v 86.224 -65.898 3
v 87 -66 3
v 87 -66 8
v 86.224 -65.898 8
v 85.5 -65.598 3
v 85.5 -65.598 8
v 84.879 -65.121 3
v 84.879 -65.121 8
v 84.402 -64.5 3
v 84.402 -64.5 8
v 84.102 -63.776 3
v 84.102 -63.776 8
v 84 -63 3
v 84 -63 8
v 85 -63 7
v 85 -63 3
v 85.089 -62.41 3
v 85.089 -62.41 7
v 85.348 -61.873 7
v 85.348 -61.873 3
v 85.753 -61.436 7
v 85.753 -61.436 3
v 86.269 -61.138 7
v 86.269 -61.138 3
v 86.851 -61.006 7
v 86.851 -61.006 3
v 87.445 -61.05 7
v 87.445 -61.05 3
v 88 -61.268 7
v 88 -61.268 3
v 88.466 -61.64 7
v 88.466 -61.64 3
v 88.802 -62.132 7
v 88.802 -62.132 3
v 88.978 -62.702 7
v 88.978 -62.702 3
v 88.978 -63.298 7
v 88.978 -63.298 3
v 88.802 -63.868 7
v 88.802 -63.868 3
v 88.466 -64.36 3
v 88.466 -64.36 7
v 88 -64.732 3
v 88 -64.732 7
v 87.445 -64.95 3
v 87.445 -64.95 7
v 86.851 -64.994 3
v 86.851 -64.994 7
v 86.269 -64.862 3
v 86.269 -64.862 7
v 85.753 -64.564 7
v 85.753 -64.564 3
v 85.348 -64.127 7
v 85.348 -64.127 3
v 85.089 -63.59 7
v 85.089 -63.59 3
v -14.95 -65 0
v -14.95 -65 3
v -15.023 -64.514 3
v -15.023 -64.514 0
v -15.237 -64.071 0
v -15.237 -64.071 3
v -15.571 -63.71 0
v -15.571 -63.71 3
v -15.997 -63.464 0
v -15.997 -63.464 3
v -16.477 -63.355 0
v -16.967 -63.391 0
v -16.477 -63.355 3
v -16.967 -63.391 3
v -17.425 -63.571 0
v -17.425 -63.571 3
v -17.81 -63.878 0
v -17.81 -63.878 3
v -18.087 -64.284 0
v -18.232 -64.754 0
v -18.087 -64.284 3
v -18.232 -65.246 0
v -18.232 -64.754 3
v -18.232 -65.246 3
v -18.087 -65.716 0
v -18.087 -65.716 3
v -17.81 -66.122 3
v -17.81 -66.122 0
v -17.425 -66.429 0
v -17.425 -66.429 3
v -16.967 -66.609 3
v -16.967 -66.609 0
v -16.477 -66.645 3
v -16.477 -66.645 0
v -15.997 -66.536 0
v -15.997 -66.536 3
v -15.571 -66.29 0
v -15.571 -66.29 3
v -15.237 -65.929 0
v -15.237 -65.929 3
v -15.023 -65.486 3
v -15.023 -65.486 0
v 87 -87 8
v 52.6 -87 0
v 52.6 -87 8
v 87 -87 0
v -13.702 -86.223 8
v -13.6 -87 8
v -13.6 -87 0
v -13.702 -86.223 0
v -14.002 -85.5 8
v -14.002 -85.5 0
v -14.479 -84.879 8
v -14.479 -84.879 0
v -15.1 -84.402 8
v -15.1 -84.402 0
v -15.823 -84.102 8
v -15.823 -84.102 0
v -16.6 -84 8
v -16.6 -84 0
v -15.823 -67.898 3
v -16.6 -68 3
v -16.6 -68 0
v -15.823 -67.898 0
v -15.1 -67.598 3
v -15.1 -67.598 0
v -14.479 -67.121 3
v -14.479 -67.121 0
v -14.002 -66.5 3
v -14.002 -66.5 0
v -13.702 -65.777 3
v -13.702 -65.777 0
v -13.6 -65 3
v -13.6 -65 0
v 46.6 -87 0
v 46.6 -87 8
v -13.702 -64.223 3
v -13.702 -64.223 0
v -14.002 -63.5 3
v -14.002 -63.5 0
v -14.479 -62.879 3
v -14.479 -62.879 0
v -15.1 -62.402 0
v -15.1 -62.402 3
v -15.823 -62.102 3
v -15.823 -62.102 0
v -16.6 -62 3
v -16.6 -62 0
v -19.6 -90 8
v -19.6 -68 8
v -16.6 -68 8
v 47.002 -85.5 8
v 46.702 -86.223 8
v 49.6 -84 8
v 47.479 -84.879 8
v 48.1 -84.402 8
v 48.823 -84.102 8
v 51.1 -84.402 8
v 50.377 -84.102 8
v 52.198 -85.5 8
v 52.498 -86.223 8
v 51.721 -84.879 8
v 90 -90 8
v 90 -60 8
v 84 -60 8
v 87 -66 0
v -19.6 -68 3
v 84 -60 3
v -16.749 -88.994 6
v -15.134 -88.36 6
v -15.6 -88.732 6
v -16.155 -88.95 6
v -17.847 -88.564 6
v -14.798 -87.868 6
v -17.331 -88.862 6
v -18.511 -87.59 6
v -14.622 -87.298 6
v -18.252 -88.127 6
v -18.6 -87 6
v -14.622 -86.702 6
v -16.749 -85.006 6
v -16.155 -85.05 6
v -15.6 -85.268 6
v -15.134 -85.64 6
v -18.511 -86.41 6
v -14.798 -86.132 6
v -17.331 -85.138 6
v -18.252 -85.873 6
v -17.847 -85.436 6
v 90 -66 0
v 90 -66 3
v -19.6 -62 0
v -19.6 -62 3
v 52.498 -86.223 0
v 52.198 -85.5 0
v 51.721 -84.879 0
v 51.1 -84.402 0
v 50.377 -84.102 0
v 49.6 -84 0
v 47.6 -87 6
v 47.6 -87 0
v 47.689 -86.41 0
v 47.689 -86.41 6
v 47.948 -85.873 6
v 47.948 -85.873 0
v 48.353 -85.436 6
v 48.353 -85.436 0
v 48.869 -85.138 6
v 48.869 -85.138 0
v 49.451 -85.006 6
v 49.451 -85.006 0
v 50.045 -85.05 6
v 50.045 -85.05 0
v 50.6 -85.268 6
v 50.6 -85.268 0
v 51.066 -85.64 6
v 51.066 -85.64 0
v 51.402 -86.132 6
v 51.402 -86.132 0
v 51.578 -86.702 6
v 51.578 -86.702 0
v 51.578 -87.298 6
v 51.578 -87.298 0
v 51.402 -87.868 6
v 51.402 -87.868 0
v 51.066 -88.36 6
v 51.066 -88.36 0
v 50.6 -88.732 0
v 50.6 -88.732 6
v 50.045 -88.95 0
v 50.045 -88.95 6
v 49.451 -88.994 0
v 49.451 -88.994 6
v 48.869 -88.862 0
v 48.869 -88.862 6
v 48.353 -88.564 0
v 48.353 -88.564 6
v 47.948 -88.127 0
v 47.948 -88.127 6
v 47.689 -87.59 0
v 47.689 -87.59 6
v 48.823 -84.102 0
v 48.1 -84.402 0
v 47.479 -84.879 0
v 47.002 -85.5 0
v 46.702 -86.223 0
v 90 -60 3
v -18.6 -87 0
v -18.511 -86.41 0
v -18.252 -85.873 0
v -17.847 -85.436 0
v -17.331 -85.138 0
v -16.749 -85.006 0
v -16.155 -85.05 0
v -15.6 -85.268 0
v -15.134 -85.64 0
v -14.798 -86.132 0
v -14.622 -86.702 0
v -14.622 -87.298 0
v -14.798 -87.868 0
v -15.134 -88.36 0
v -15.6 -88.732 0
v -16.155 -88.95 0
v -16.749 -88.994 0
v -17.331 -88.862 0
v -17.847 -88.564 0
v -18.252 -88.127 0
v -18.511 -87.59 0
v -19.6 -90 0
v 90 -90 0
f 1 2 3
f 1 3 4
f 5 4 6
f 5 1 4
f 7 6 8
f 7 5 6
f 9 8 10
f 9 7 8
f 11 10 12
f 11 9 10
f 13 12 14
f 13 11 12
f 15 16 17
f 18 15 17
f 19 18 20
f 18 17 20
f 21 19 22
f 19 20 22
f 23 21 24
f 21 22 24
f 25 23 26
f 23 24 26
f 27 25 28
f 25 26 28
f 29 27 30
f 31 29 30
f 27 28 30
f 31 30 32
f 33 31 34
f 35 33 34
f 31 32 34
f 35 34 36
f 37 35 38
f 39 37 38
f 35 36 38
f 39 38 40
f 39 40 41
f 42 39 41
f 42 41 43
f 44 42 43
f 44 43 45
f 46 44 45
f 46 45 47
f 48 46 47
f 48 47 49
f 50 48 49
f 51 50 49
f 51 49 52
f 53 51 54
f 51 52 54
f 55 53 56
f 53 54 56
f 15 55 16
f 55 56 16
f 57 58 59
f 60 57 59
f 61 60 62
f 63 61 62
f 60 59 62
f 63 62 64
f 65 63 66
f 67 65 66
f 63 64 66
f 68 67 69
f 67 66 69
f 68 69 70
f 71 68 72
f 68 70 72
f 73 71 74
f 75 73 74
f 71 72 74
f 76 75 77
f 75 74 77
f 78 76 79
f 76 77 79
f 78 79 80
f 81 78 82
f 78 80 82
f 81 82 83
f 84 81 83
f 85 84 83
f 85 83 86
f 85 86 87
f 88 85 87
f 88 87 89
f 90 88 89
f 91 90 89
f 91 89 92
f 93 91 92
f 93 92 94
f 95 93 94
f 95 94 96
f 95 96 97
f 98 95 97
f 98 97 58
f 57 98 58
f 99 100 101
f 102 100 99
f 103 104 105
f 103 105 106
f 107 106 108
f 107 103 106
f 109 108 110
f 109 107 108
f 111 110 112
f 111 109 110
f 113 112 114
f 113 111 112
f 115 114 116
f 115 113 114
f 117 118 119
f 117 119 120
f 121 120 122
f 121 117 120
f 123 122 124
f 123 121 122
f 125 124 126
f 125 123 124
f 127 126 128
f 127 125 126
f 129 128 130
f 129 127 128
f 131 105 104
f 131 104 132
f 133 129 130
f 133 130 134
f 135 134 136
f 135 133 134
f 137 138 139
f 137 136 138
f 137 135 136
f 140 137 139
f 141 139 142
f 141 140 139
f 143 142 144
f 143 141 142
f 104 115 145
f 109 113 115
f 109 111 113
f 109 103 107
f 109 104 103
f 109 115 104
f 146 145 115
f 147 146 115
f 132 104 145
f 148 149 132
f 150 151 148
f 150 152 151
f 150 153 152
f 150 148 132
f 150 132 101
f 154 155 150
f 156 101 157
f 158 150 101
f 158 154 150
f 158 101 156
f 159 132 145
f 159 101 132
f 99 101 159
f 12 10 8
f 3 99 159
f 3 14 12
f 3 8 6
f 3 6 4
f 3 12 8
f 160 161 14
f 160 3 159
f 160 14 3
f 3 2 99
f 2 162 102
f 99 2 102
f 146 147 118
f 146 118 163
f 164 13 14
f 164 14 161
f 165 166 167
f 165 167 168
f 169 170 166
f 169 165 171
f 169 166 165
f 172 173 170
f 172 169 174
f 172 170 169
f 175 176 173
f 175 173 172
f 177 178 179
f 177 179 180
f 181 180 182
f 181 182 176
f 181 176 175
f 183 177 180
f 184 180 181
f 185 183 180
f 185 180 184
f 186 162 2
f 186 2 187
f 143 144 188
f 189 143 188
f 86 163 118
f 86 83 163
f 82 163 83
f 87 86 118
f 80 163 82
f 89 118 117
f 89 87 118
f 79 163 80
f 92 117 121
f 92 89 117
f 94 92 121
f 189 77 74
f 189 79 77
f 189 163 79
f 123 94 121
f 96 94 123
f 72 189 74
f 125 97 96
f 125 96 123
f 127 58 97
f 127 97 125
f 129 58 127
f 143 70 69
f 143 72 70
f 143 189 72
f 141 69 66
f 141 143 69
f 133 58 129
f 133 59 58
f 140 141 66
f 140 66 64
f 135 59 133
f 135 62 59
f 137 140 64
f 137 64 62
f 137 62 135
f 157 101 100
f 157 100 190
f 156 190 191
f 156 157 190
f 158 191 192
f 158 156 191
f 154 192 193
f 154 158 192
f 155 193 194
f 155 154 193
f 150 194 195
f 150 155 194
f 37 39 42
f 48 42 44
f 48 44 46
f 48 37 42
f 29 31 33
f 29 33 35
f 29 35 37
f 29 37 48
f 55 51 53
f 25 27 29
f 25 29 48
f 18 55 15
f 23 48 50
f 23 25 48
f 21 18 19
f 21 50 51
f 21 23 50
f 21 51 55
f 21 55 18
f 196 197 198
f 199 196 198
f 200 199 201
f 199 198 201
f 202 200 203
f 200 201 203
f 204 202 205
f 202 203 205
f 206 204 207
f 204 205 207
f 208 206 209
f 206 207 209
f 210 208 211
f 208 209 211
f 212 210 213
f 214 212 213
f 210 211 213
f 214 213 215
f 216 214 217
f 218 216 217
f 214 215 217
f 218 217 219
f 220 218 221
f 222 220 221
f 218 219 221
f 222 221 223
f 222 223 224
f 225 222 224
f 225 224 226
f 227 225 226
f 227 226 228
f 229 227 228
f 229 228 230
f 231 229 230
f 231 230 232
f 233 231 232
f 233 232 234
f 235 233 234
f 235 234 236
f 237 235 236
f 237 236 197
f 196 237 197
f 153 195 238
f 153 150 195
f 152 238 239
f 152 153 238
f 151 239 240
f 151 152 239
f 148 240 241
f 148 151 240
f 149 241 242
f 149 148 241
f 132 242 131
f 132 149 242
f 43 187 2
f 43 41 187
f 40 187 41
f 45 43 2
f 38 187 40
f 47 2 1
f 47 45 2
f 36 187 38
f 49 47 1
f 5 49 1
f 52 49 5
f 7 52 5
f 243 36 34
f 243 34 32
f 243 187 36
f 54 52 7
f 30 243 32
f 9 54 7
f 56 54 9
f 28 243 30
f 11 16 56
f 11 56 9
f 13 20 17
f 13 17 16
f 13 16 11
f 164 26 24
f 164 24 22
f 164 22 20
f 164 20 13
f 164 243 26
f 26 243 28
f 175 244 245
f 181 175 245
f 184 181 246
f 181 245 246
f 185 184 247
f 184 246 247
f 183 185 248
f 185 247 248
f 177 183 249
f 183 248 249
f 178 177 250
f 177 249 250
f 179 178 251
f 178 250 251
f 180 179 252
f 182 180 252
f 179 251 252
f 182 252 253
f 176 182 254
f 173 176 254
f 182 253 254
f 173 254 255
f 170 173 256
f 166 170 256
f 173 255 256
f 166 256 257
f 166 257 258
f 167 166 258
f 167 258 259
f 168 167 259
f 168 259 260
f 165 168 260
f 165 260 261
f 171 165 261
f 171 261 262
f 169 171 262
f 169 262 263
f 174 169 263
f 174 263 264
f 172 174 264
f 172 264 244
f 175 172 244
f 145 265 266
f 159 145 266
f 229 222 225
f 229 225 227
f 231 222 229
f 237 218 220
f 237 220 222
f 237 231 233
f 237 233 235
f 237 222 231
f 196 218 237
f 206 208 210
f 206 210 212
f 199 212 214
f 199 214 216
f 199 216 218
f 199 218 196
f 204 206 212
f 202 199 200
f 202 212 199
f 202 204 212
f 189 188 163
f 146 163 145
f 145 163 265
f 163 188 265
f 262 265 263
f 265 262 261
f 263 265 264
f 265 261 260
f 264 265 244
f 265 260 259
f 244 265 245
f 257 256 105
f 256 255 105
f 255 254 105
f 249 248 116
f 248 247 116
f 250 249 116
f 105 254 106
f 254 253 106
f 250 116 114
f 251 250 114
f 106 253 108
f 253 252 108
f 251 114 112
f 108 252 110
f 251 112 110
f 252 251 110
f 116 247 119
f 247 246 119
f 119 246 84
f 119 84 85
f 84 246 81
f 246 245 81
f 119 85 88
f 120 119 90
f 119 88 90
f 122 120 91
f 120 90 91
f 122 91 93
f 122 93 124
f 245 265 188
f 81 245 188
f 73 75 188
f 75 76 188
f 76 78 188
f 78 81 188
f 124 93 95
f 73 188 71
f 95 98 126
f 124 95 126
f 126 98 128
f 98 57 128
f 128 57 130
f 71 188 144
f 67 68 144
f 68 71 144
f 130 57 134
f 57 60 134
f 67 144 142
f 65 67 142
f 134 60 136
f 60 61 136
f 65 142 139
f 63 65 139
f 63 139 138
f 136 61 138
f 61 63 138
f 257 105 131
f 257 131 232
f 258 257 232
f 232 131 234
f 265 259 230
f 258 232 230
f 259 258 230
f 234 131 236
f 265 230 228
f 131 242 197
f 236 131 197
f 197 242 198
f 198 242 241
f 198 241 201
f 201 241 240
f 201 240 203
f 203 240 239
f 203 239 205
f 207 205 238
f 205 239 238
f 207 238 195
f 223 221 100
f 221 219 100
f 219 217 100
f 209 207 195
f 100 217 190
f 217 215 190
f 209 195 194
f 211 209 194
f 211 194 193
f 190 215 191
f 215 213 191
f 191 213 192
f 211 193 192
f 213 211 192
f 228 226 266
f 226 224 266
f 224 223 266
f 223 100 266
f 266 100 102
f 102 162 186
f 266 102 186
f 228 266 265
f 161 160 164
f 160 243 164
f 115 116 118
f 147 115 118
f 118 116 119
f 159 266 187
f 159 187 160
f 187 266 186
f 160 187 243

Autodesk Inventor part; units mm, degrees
ref_plane "YZ Plane" through (0, 0, 0) normal (1, 0, 0) x (0, 1, 0)
ref_plane "XZ Plane" through (0, 0, 0) normal (0, 1, 0) x (-1, 0, 0)
ref_plane "XY Plane" through (0, 0, 0) normal (0, 0, 1) x (1, 0, 0)
sketch "Sketch1" plane through (0, 0, 0) normal (0, 0, 1) x (1, 0, 0)
  line L0 (-58, -60) -> (-60, -60) projected
  line L1 (-60, -60) -> (-60, -39.5) projected
  line L2 (-60, -39.5) -> (-58, -39.5) projected
  line L3 (-58, -39.5) -> (-58, -60) projected
  line L4 (49.6, 30) -> (51.6, 30) projected
  line L5 (51.6, 30) -> (51.6, 9.5) projected
  line L6 (51.6, 9.5) -> (49.6, 9.5) projected
  line L7 (49.6, 9.5) -> (49.6, 30) projected
  line L8 (-58, 39.5) -> (-60, 39.5) projected
  line L9 (-60, 39.5) -> (-60, 60) projected
  line L10 (-60, 60) -> (-58, 60) projected
  line L11 (-58, 60) -> (-58, 39.5) projected
  line L12 (-21.6, -39.5) -> (-19.6, -39.5) projected
  line L13 (-19.6, -39.5) -> (-19.6, -60) projected
  line L14 (-19.6, -60) -> (-21.6, -60) projected
  line L15 (-21.6, -60) -> (-21.6, -39.5) projected
  line L16 (51.6, -30) -> (49.6, -30) projected
  line L17 (49.6, -30) -> (49.6, -9.5) projected
  line L18 (49.6, -9.5) -> (51.6, -9.5) projected
  line L19 (51.6, -9.5) -> (51.6, -30) projected
  line L20 (-21.6, 60) -> (-19.6, 60) projected
  line L21 (-19.6, 60) -> (-19.6, 39.5) projected
  line L22 (-19.6, 39.5) -> (-21.6, 39.5) projected
  line L23 (-21.6, 39.5) -> (-21.6, 60) projected
  line L24 (90, -35) -> (90, 35) projected
  line L25 (90, 35) -> (49.6, 35) projected
  line L26 (49.6, 35) -> (49.6, 60) projected
  line L27 (49.6, 60) -> (90, 60) projected
  line L28 (90, 60) -> (90, 90) projected
  line L29 (90, 90) -> (-19.6, 90) projected
  line L30 (-19.6, 90) -> (-19.6, 65) projected
  line L31 (-19.6, 65) -> (-60, 65) projected
  line L32 (-60, 65) -> (-60, 90) projected
  line L33 (-60, 90) -> (-90, 90) projected
  line L34 (-90, 90) -> (-90, -90) projected
  line L35 (-90, -90) -> (-60, -90) projected
  line L36 (-60, -90) -> (-60, -65) projected
  line L37 (-60, -65) -> (-19.6, -65) projected
  line L38 (-19.6, -65) -> (-19.6, -90) projected
  line L39 (-19.6, -90) -> (90, -90) projected
  line L40 (90, -90) -> (90, -60) projected
  line L41 (90, -60) -> (49.6, -60) projected
  line L42 (49.6, -60) -> (49.6, -35) projected
  line L43 (49.6, -35) -> (90, -35) projected
  line L44 (86, -32) -> (73.8, -32) projected
  line L45 (73.8, -32) -> (73.8, -7.5) projected
  line L46 (73.8, -7.5) -> (86, -7.5) projected
  line L47 (86, -7.5) -> (86, -32) projected
  line L48 (65.8, -32) -> (53.6, -32) projected
  line L49 (53.6, -32) -> (53.6, -7.5) projected
  line L50 (53.6, -7.5) -> (65.8, -7.5) projected
  line L51 (65.8, -7.5) -> (65.8, -32) projected
  line L52 (86, -86) -> (70.6, -86) projected
  line L53 (70.6, -86) -> (70.6, -69.8) projected
  line L54 (70.6, -69.8) -> (86, -69.8) projected
  line L55 (86, -69.8) -> (86, -86) projected
  line L56 (86, 86) -> (86, 69.8) projected
  line L57 (86, 69.8) -> (70.6, 69.8) projected
  line L58 (70.6, 69.8) -> (70.6, 86) projected
  line L59 (70.6, 86) -> (86, 86) projected
  line L60 (73.8, 32) -> (86, 32) projected
  line L61 (86, 32) -> (86, 7.5) projected
  line L62 (86, 7.5) -> (73.8, 7.5) projected
  line L63 (73.8, 7.5) -> (73.8, 32) projected
  line L64 (65.8, 32) -> (65.8, 7.5) projected
  line L65 (65.8, 7.5) -> (53.6, 7.5) projected
  line L66 (53.6, 7.5) -> (53.6, 32) projected
  line L67 (53.6, 32) -> (65.8, 32) projected
  line L68 (-69.6, -87) -> (-85, -87) projected
  line L69 (-85, -87) -> (-85, -70.8) projected
  line L70 (-85, -70.8) -> (-69.6, -70.8) projected
  line L71 (-69.6, -70.8) -> (-69.6, -87) projected
  line L72 (-56, -62) -> (-56, -37.5) projected
  line L73 (-56, -37.5) -> (-43.8, -37.5) projected
  line L74 (-43.8, -37.5) -> (-43.8, -62) projected
  line L75 (-43.8, -62) -> (-56, -62) projected
  line L76 (-56, 62) -> (-43.8, 62) projected
  line L77 (-43.8, 62) -> (-43.8, 37.5) projected
  line L78 (-43.8, 37.5) -> (-56, 37.5) projected
  line L79 (-56, 37.5) -> (-56, 62) projected
  line L80 (-23.6, 62) -> (-23.6, 37.5) projected
  line L81 (-23.6, 37.5) -> (-35.8, 37.5) projected
  line L82 (-35.8, 37.5) -> (-35.8, 62) projected
  line L83 (-35.8, 62) -> (-23.6, 62) projected
  line L84 (-23.6, -62) -> (-35.8, -62) projected
  line L85 (-35.8, -62) -> (-35.8, -37.5) projected
  line L86 (-35.8, -37.5) -> (-23.6, -37.5) projected
  line L87 (-23.6, -37.5) -> (-23.6, -62) projected
  line L88 (-85, 87) -> (-69.6, 87) projected
  line L89 (-69.6, 87) -> (-69.6, 70.8) projected
  line L90 (-69.6, 70.8) -> (-85, 70.8) projected
  line L91 (-85, 70.8) -> (-85, 87) projected
  circle A0 centre (87, -63) radius 2 projected
  line L92 (90, -60) -> (90, -66) projected
  line L93 (84, -60) -> (90, -60) projected
  line L94 (84, -63) -> (84, -60) projected
  line L95 (90, -66) -> (87, -66) projected
  line L96 (-19.6, 68) -> (-16.6, 68) projected
  line L97 (-16.6, 68) -> (-16.6, 84) projected
  line L98 (-13.6, 87) -> (46.6, 87) projected
  line L99 (52.6, 87) -> (87, 87) projected
  line L100 (87, 87) -> (87, 66) projected
  line L101 (84, 63) -> (84, 60) projected
  line L102 (84, 60) -> (90, 60) projected
  line L103 (90, 60) -> (90, 90) projected
  line L104 (90, 90) -> (-19.6, 90) projected
  line L105 (-19.6, 90) -> (-19.6, 68) projected
  line L106 (90, -66) -> (87, -66)
  line L107 (87, -66) -> (87, -90)
  line L108 (87, -90) -> (90, -90)
  line L109 (90, -90) -> (90, -66)
  line L110 (87, -90) -> (-19.6, -90)
  line L111 (-19.6, -90) -> (-19.6, -87)
  line L112 (-19.6, -87) -> (87, -87)
  line L113 (87, -87) -> (87, -90)
  line L114 (-19.6, -87) -> (-16.6, -87)
  line L115 (-16.6, -87) -> (-16.6, -65)
  line L116 (-16.6, -65) -> (-19.6, -65)
  line L117 (-19.6, -65) -> (-19.6, -87)
  line L118 (-19.6, -65) -> (-16.6, -65)
  line L119 (-16.6, -65) -> (-16.6, -68)
  line L120 (-16.6, -68) -> (-19.6, -68)
  line L121 (-19.6, -68) -> (-19.6, -65)
  line L122 (-19.6, -68) -> (-13.6, -68)
  line L123 (-13.6, -68) -> (-13.6, -62)
  line L124 (-13.6, -62) -> (-19.6, -62)
  line L125 (-19.6, -62) -> (-19.6, -68)
  line L126 (-19.6, -90) -> (-13.6, -90)
  line L127 (-13.6, -90) -> (-13.6, -84)
  line L128 (-13.6, -84) -> (-19.6, -84)
  line L129 (-19.6, -84) -> (-19.6, -90)
  line L130 (46.6, -90) -> (52.6, -90)
  line L131 (52.6, -90) -> (52.6, -84)
  line L132 (52.6, -84) -> (46.6, -84)
  line L133 (46.6, -84) -> (46.6, -90)
  circle A1 centre (-63, -65) radius 1.5 projected
  circle A2 centre (-16.6, -87) radius 1.5 projected
  circle A3 centre (49.6, -87) radius 1.5 projected
  circle A4 centre (46.6, -60) radius 1.5 projected
  circle A5 centre (87, -63) radius 1.5 projected
  circle A6 centre (46.6, -32) radius 1.5 projected
  circle A7 centre (46.6, 32) radius 1.5 projected
  circle A8 centre (87, 63) radius 1.5 projected
  circle A9 centre (46.6, 60) radius 1.5 projected
  circle A10 centre (49.6, 87) radius 1.5 projected
  circle A11 centre (-16.6, 87) radius 1.5 projected
  circle A12 centre (-16.6, 65) radius 1.5 projected
  circle A13 centre (-63, 65) radius 1.5 projected
  arc A14 (87, 66) -> (84, 63) centre (87, 63) ccw projected
  arc A15 (-16.6, 84) -> (-13.6, 87) centre (-16.6, 87) ccw projected
  arc A16 (46.6, 87) -> (52.6, 87) centre (49.6, 87) ccw projected
  arc A17 (84, -63) -> (87, -66) centre (87, -63) ccw projected
  line L134 (-76, -39.25) -> (-82, -39.25) projected
  line L135 (-82, -39.25) -> (-82, -20.75) projected
  line L136 (-82, -20.75) -> (-76, -20.75) projected
  line L137 (-76, -20.75) -> (-76, -39.25) projected
  line L138 (-76, 20.75) -> (-82, 20.75) projected
  line L139 (-82, 20.75) -> (-82, 39.25) projected
  line L140 (-82, 39.25) -> (-76, 39.25) projected
  line L141 (-76, 39.25) -> (-76, 20.75) projected
  circle A18 centre (-87, 55.8) radius 1.25 projected
  circle A19 centre (-87, -55.8) radius 1.25 projected
  point P0 (0, 0)
  point P1 (52.6, -87)
  point P2 (46.6, -87)
  point P3 (-13.6, -87)
  point P4 (-16.6, -84)
  dimension "d0" = 3
  dimension "d1" = 3
  dimension "d2" = 6
  dimension "d3" = 6
  dimension "d4" = 6
  dimension "d5" = 6
  dimension "d6" = 6
  dimension "d7" = 6
extrude "Extrusion1" add sketch "Sketch1" along normal blind 8 contours L41 L40 L95 A17 L94 | L40 L39 L107 L95 | L107 L39 L131 L112 | L131 L39 L133 L112 A3 | L112 A3 L133 L132 L131 | A3 L112 | L112 A3 | L39 L127 L112 L133 | L39 L38 L112 A2 L127 | L112 A2 L115 L128 L127 | L38 L128 L115 A2 L112 | A2 L112 | L112 L115 A2 | L38 L120 L115 L128 | A2 L115 L112 | L38 L116 L115 L120 | L115 L116 L125 L124 L123 L122 | A0 | A5
sketch "Sketch2" plane through (0, 0, 0) normal (0, 0, -1) x (-1, 0, 0)
  line L0 (-84, -66) -> (-87, -66) projected
  line L1 (-90, -90) -> (-90, -60) projected
  line L2 (-84, -66) -> (-90, -66)
  line L3 (-90, -66) -> (-90, -60)
  line L4 (-90, -60) -> (-84, -60)
  line L5 (-84, -60) -> (-84, -66)
  line L6 (-84, -60) -> (-90, -66)
  line L7 (-90, -60) -> (-84, -66)
  circle A0 centre (-87, -63) radius 2
  line L8 (-52.6, -84) -> (-46.6, -84) projected
  line L9 (-46.6, -84) -> (-52.6, -90)
  line L10 (19.6, -90) -> (-90, -90) projected
  line L11 (-52.6, -84) -> (-46.6, -90)
  line L12 (-46.6, -90) -> (-46.6, -84)
  line L13 (-52.6, -84) -> (-52.6, -90)
  circle A1 centre (-49.6, -87) radius 2
  line L14 (13.6, -84) -> (16.6, -84) projected
  line L15 (13.6, -84) -> (19.6, -90)
  line L16 (19.6, -62) -> (19.6, -90) projected
  line L17 (19.6, -84) -> (13.6, -90)
  line L18 (19.6, -84) -> (13.6, -84)
  circle A2 centre (16.6, -87) radius 2
  line L19 (13.6, -68) -> (13.6, -62) projected
  line L20 (13.6, -68) -> (19.6, -62)
  line L21 (19.6, -68) -> (13.6, -62)
  line L22 (13.6, -62) -> (13.6, -68)
  line L23 (19.6, -68) -> (13.6, -68)
  circle A3 centre (16.6, -65) radius 2
  point P0 (0, 0)
  point P1 (19.6, -87)
  dimension "d10" = 4
  dimension "d11" = 4
  dimension "d12" = 4
  dimension "d13" = 4
extrude "Extrusion2" cut sketch "Sketch2" against normal blind 6 contours A1 L9 L11 | L11 L9 A1 | A1 L11 L9 | L11 A1 L9 | A2 L17 L15 | L15 L17 A2 | A2 L15 L17 | L15 A2 L17
extrude "Extrusion3" cut sketch "Sketch2" against normal blind 7 contours A0 L6 L7 | L7 L6 A0 | L6 L7 A0 | L6 A0 L7
extrude "Extrusion4" cut sketch "Sketch2" against normal blind 3 contours L7 A0 L6 L5 | L0 L2 L6 A0 L7 | L6 A0 L7 L4 | L1 L7 A0 L6
sketch "Sketch3" plane through (0, 0, 8) normal (0, 0, 1) x (1, 0, 0)
  line L0 (-16.6, -68) -> (-13.6, -68) projected
  line L1 (-19.6, -62) -> (-19.6, -90) projected
  line L2 (-13.6, -68) -> (-19.6, -62)
  line L3 (-19.6, -62) -> (-13.6, -62)
  line L4 (-13.6, -62) -> (-19.6, -68)
  line L5 (-13.6, -68) -> (-19.6, -68)
  line L6 (-13.6, -62) -> (-13.6, -68)
  circle A0 centre (-16.6, -65) radius 1.65
  point P0 (0, 0)
  point P1 (-19.6, -87)
  point P2 (-17.7667, -66.1667)
  point P3 (-17.7667, -63.8333)
  dimension "d20" = 3.3
extrude "Extrusion5" cut sketch "Sketch3" against normal blind 5 contours L5 L4 A0 L2 L0 | L2 A0 L4 L6 | L1 L2 A0 L4 | L4 A0 L2 L3
extrude "Extrusion6" cut sketch "Sketch3" against normal blind 8 contours A0 L4 L2 | L2 L4 A0 | A0 L2 L4 | L2 A0 L4
fillet "Fillet1" radius 3 5 edges at (52.6, -84, 4) (46.6, -84, 4) (-13.6, -68, 1.5) (-13.6, -62, 1.5) (-13.6, -84, 4)
properties part number "rightwall2"
